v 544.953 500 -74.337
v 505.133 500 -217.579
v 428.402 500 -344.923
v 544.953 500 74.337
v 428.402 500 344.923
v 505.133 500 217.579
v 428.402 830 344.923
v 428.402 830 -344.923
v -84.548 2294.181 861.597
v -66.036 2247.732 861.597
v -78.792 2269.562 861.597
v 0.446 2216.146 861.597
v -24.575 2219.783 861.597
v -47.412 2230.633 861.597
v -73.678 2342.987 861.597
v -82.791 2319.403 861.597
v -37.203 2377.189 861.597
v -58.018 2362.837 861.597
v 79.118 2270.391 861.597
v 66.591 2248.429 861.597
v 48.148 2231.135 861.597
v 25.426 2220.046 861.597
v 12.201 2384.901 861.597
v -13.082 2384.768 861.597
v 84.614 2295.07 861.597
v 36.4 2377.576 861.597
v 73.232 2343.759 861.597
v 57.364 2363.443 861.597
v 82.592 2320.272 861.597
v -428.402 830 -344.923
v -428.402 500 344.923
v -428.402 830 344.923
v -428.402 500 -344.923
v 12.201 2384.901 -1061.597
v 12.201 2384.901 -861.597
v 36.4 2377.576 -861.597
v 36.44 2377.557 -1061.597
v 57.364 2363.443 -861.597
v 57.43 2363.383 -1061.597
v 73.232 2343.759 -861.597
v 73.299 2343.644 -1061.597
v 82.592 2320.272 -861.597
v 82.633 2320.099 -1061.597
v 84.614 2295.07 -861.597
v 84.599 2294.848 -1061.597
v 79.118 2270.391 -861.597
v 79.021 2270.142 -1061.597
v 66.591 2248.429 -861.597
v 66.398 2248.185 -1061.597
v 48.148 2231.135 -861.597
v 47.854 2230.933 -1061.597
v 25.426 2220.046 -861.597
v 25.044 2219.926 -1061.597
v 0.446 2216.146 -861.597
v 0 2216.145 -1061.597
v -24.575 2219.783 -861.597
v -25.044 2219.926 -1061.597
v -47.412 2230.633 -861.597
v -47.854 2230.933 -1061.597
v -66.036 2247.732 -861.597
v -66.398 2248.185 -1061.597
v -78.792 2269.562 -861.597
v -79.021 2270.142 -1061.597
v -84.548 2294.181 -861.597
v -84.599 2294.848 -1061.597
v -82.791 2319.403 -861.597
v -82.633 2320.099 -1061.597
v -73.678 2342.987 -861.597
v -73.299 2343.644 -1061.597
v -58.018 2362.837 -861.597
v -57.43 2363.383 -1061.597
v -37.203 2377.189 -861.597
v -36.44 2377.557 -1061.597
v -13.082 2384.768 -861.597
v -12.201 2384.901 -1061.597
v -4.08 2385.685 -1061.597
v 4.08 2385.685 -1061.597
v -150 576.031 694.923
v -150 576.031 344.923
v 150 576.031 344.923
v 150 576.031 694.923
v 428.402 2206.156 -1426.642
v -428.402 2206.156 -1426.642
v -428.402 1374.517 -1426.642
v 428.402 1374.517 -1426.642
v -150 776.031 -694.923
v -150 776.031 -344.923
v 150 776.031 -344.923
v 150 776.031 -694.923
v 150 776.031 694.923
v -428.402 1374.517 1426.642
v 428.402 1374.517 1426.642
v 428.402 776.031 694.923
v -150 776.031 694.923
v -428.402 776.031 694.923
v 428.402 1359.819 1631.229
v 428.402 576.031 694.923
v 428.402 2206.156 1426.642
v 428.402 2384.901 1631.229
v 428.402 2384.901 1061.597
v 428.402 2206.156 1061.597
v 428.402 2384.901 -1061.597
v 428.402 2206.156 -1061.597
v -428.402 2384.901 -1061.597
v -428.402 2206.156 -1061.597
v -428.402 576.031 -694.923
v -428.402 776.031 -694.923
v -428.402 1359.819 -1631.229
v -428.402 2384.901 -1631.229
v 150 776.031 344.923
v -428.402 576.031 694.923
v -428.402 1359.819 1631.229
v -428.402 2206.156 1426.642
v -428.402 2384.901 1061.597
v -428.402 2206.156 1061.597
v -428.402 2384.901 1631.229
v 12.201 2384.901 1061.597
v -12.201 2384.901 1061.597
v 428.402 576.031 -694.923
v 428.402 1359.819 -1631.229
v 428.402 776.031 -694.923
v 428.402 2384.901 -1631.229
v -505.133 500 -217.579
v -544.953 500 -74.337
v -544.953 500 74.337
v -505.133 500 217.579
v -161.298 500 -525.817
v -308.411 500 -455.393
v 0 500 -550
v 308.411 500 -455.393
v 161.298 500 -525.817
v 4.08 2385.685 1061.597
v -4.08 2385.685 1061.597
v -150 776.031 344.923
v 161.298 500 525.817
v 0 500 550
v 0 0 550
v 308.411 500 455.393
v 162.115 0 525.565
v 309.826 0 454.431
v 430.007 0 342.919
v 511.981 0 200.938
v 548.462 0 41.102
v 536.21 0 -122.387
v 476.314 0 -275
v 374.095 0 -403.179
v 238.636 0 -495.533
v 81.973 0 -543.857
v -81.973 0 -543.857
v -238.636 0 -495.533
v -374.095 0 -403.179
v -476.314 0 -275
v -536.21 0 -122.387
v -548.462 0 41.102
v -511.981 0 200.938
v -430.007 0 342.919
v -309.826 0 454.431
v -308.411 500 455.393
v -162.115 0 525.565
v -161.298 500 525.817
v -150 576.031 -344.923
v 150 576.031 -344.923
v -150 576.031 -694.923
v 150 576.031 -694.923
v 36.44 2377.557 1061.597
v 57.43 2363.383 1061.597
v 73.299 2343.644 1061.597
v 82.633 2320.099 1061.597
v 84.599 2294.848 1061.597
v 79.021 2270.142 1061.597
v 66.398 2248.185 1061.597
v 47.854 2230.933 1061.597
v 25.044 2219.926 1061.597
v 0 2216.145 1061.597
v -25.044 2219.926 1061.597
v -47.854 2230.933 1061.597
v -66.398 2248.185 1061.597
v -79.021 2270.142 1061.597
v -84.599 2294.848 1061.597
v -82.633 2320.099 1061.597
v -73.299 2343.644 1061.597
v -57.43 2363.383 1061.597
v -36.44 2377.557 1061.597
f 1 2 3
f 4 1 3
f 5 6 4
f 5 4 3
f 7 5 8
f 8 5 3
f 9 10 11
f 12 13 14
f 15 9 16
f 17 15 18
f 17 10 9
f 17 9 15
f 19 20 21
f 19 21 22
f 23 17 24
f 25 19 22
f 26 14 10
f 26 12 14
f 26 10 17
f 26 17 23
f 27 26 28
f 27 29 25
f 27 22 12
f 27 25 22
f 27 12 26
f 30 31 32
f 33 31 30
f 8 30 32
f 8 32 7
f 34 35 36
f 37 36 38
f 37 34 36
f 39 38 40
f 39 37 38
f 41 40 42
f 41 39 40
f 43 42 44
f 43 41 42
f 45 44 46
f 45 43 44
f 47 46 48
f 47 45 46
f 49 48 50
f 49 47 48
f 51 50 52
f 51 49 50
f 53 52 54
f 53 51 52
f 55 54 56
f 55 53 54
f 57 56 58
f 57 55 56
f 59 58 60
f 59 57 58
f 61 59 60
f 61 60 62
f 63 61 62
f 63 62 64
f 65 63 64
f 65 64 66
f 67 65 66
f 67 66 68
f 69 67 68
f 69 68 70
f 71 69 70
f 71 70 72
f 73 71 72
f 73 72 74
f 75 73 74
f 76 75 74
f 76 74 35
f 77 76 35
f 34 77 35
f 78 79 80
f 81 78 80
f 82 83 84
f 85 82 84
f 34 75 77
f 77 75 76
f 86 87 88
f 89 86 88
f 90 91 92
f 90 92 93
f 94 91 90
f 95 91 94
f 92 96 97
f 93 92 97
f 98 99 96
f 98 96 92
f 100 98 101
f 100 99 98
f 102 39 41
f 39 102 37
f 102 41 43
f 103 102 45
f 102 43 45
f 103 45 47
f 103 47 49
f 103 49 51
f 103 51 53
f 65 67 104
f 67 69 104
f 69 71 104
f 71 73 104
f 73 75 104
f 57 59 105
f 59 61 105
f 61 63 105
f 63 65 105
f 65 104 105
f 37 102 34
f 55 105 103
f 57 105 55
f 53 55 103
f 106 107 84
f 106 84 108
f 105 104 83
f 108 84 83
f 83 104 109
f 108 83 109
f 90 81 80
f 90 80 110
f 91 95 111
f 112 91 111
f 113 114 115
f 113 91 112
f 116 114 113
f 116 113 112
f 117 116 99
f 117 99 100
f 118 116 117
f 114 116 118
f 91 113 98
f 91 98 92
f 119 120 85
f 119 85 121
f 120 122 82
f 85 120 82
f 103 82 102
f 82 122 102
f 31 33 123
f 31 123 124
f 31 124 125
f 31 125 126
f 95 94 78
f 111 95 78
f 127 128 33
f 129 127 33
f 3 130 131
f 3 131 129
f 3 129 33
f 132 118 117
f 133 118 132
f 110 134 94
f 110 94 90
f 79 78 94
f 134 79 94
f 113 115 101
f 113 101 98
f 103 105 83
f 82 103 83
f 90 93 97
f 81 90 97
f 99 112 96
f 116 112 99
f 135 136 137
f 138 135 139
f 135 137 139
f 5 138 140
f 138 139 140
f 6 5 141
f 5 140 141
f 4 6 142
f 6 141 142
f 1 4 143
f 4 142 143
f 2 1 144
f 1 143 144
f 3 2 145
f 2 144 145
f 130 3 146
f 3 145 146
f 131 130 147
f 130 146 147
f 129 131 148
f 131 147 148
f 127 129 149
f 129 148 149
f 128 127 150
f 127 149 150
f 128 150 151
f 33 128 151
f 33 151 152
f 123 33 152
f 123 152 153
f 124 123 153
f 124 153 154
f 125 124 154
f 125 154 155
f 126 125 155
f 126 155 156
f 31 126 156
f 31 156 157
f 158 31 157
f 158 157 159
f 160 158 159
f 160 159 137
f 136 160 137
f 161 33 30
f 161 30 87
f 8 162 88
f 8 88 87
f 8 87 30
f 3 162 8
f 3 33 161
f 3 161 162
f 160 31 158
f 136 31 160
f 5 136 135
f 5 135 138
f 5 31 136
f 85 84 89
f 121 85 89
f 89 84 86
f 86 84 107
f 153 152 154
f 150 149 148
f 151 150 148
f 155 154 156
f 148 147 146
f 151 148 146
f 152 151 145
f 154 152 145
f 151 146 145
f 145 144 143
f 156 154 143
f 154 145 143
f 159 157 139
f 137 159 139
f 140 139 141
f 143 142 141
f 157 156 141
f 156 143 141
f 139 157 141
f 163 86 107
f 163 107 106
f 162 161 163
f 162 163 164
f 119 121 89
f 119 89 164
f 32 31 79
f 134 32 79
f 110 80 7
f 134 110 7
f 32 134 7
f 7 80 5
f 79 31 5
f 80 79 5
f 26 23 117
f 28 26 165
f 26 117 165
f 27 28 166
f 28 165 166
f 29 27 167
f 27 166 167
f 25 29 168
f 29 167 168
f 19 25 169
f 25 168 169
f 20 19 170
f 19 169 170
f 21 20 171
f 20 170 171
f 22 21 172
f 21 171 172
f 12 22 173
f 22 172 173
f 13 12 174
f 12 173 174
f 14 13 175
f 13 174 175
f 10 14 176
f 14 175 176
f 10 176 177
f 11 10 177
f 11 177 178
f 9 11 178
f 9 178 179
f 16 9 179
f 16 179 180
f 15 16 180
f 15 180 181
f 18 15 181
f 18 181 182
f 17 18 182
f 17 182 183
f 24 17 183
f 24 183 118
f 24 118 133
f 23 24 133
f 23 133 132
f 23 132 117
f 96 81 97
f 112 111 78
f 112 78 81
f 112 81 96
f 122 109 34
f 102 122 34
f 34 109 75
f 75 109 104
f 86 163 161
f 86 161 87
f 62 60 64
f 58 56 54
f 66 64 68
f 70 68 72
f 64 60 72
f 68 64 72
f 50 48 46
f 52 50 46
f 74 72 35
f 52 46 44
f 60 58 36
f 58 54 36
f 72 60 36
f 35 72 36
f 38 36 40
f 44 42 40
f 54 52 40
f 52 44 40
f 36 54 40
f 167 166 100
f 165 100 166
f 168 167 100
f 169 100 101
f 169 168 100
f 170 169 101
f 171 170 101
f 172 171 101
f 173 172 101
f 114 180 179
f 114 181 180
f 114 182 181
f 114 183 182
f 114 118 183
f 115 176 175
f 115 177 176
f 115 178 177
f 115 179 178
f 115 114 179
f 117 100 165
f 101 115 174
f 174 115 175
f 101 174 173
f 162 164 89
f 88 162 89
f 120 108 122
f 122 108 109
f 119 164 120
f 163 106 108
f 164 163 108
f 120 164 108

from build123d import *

# Parameters (mm, degrees)
SKETCH1_R                     = 550
BASE_DEPTH                    = 500
SKETCH2_W                     = 856.804380184
SKETCH2_H                     = 689.845094276
ARM_CONNECTION_POINT_DEPTH    = 330
SKETCH3_W                     = 300
SKETCH3_H                     = 200
ARM_BASE_DEPTH                = 350
ARM_REACH                     = 1461.14
SKETCH5_R                     = 84.81932495
ARM_CONNECTION_TO_LIGHT_DEPTH = 200


with BuildPart() as part:
    # Sketch1 → Base (new body)
    with BuildSketch(Plane(origin=(0, 0, 0), x_dir=(1, 0, 0), z_dir=(0, 1, 0))):
        with Locations(Location((0, 0, 0), (0, 0, 270))):
            Circle(SKETCH1_R)
    extrude(amount=BASE_DEPTH)

    # Sketch2 → Arm Connection Point (add)
    with BuildSketch(Plane(origin=(0, 500, 0), x_dir=(1, 0, 0), z_dir=(0, 1, 0))):
        Rectangle(SKETCH2_W, SKETCH2_H)
    extrude(amount=ARM_CONNECTION_POINT_DEPTH)

    # Sketch3 → Arm Base (add)
    with BuildSketch(Plane.XY.offset(344.922547138)):
        with Locations((0, 676.031229805)):
            Rectangle(SKETCH3_W, SKETCH3_H)
    arm_base = extrude(amount=ARM_BASE_DEPTH)

    # Arm: up to this face of the body (flat: up to its plane)
    arm_end = Plane(part.part.faces().sort_by_distance((428.402190092, 665, 0))[0])
    # Sketch4 → Arm (add, up to the picked face)
    with BuildSketch(Plane.ZY.offset(428.402190092), mode=Mode.PRIVATE) as arm_sk1:
        Polygon((694.922547138, 776.031229805), (694.922547138, 576.031229805), (1631.228784508, 1359.819453712), (1631.228784508, 2384.901293654), (1061.596658622, 2384.901293654), (1061.596658622, 2206.156350413), (1426.64220319, 2206.156350413), (1426.64220319, 1374.517361044), align=None)
    arm_tool1 = split(extrude(arm_sk1.sketch, amount=-ARM_REACH, mode=Mode.PRIVATE), bisect_by=arm_end, keep=Keep.BOTH, mode=Mode.PRIVATE)
    arm = arm_tool1.solids().sort_by(Axis((-428.40219, 676.03123, 715.290857), (1, 0, 0)))[0]
    add(arm)

    # Mirror1: Arm Base, Arm across plane
    add(arm_base.mirror(Plane.XY))
    add(arm.mirror(Plane.XY))

    # Sketch5 → Arm Connection to Light (add)
    with BuildSketch(Plane(origin=(0, 0, 1061.596658622), x_dir=(-1, 0, 0), z_dir=(0, 0, -1))):
        with Locations(Location((0, 2300.964058939, 0), (0, 0, 98.270348808))):
            Circle(SKETCH5_R)
    arm_connection_to_light = extrude(amount=ARM_CONNECTION_TO_LIGHT_DEPTH)

    # Mirror2: Arm Connection to Light across plane
    add(arm_connection_to_light.mirror(Plane.XY))


solid = part.part
